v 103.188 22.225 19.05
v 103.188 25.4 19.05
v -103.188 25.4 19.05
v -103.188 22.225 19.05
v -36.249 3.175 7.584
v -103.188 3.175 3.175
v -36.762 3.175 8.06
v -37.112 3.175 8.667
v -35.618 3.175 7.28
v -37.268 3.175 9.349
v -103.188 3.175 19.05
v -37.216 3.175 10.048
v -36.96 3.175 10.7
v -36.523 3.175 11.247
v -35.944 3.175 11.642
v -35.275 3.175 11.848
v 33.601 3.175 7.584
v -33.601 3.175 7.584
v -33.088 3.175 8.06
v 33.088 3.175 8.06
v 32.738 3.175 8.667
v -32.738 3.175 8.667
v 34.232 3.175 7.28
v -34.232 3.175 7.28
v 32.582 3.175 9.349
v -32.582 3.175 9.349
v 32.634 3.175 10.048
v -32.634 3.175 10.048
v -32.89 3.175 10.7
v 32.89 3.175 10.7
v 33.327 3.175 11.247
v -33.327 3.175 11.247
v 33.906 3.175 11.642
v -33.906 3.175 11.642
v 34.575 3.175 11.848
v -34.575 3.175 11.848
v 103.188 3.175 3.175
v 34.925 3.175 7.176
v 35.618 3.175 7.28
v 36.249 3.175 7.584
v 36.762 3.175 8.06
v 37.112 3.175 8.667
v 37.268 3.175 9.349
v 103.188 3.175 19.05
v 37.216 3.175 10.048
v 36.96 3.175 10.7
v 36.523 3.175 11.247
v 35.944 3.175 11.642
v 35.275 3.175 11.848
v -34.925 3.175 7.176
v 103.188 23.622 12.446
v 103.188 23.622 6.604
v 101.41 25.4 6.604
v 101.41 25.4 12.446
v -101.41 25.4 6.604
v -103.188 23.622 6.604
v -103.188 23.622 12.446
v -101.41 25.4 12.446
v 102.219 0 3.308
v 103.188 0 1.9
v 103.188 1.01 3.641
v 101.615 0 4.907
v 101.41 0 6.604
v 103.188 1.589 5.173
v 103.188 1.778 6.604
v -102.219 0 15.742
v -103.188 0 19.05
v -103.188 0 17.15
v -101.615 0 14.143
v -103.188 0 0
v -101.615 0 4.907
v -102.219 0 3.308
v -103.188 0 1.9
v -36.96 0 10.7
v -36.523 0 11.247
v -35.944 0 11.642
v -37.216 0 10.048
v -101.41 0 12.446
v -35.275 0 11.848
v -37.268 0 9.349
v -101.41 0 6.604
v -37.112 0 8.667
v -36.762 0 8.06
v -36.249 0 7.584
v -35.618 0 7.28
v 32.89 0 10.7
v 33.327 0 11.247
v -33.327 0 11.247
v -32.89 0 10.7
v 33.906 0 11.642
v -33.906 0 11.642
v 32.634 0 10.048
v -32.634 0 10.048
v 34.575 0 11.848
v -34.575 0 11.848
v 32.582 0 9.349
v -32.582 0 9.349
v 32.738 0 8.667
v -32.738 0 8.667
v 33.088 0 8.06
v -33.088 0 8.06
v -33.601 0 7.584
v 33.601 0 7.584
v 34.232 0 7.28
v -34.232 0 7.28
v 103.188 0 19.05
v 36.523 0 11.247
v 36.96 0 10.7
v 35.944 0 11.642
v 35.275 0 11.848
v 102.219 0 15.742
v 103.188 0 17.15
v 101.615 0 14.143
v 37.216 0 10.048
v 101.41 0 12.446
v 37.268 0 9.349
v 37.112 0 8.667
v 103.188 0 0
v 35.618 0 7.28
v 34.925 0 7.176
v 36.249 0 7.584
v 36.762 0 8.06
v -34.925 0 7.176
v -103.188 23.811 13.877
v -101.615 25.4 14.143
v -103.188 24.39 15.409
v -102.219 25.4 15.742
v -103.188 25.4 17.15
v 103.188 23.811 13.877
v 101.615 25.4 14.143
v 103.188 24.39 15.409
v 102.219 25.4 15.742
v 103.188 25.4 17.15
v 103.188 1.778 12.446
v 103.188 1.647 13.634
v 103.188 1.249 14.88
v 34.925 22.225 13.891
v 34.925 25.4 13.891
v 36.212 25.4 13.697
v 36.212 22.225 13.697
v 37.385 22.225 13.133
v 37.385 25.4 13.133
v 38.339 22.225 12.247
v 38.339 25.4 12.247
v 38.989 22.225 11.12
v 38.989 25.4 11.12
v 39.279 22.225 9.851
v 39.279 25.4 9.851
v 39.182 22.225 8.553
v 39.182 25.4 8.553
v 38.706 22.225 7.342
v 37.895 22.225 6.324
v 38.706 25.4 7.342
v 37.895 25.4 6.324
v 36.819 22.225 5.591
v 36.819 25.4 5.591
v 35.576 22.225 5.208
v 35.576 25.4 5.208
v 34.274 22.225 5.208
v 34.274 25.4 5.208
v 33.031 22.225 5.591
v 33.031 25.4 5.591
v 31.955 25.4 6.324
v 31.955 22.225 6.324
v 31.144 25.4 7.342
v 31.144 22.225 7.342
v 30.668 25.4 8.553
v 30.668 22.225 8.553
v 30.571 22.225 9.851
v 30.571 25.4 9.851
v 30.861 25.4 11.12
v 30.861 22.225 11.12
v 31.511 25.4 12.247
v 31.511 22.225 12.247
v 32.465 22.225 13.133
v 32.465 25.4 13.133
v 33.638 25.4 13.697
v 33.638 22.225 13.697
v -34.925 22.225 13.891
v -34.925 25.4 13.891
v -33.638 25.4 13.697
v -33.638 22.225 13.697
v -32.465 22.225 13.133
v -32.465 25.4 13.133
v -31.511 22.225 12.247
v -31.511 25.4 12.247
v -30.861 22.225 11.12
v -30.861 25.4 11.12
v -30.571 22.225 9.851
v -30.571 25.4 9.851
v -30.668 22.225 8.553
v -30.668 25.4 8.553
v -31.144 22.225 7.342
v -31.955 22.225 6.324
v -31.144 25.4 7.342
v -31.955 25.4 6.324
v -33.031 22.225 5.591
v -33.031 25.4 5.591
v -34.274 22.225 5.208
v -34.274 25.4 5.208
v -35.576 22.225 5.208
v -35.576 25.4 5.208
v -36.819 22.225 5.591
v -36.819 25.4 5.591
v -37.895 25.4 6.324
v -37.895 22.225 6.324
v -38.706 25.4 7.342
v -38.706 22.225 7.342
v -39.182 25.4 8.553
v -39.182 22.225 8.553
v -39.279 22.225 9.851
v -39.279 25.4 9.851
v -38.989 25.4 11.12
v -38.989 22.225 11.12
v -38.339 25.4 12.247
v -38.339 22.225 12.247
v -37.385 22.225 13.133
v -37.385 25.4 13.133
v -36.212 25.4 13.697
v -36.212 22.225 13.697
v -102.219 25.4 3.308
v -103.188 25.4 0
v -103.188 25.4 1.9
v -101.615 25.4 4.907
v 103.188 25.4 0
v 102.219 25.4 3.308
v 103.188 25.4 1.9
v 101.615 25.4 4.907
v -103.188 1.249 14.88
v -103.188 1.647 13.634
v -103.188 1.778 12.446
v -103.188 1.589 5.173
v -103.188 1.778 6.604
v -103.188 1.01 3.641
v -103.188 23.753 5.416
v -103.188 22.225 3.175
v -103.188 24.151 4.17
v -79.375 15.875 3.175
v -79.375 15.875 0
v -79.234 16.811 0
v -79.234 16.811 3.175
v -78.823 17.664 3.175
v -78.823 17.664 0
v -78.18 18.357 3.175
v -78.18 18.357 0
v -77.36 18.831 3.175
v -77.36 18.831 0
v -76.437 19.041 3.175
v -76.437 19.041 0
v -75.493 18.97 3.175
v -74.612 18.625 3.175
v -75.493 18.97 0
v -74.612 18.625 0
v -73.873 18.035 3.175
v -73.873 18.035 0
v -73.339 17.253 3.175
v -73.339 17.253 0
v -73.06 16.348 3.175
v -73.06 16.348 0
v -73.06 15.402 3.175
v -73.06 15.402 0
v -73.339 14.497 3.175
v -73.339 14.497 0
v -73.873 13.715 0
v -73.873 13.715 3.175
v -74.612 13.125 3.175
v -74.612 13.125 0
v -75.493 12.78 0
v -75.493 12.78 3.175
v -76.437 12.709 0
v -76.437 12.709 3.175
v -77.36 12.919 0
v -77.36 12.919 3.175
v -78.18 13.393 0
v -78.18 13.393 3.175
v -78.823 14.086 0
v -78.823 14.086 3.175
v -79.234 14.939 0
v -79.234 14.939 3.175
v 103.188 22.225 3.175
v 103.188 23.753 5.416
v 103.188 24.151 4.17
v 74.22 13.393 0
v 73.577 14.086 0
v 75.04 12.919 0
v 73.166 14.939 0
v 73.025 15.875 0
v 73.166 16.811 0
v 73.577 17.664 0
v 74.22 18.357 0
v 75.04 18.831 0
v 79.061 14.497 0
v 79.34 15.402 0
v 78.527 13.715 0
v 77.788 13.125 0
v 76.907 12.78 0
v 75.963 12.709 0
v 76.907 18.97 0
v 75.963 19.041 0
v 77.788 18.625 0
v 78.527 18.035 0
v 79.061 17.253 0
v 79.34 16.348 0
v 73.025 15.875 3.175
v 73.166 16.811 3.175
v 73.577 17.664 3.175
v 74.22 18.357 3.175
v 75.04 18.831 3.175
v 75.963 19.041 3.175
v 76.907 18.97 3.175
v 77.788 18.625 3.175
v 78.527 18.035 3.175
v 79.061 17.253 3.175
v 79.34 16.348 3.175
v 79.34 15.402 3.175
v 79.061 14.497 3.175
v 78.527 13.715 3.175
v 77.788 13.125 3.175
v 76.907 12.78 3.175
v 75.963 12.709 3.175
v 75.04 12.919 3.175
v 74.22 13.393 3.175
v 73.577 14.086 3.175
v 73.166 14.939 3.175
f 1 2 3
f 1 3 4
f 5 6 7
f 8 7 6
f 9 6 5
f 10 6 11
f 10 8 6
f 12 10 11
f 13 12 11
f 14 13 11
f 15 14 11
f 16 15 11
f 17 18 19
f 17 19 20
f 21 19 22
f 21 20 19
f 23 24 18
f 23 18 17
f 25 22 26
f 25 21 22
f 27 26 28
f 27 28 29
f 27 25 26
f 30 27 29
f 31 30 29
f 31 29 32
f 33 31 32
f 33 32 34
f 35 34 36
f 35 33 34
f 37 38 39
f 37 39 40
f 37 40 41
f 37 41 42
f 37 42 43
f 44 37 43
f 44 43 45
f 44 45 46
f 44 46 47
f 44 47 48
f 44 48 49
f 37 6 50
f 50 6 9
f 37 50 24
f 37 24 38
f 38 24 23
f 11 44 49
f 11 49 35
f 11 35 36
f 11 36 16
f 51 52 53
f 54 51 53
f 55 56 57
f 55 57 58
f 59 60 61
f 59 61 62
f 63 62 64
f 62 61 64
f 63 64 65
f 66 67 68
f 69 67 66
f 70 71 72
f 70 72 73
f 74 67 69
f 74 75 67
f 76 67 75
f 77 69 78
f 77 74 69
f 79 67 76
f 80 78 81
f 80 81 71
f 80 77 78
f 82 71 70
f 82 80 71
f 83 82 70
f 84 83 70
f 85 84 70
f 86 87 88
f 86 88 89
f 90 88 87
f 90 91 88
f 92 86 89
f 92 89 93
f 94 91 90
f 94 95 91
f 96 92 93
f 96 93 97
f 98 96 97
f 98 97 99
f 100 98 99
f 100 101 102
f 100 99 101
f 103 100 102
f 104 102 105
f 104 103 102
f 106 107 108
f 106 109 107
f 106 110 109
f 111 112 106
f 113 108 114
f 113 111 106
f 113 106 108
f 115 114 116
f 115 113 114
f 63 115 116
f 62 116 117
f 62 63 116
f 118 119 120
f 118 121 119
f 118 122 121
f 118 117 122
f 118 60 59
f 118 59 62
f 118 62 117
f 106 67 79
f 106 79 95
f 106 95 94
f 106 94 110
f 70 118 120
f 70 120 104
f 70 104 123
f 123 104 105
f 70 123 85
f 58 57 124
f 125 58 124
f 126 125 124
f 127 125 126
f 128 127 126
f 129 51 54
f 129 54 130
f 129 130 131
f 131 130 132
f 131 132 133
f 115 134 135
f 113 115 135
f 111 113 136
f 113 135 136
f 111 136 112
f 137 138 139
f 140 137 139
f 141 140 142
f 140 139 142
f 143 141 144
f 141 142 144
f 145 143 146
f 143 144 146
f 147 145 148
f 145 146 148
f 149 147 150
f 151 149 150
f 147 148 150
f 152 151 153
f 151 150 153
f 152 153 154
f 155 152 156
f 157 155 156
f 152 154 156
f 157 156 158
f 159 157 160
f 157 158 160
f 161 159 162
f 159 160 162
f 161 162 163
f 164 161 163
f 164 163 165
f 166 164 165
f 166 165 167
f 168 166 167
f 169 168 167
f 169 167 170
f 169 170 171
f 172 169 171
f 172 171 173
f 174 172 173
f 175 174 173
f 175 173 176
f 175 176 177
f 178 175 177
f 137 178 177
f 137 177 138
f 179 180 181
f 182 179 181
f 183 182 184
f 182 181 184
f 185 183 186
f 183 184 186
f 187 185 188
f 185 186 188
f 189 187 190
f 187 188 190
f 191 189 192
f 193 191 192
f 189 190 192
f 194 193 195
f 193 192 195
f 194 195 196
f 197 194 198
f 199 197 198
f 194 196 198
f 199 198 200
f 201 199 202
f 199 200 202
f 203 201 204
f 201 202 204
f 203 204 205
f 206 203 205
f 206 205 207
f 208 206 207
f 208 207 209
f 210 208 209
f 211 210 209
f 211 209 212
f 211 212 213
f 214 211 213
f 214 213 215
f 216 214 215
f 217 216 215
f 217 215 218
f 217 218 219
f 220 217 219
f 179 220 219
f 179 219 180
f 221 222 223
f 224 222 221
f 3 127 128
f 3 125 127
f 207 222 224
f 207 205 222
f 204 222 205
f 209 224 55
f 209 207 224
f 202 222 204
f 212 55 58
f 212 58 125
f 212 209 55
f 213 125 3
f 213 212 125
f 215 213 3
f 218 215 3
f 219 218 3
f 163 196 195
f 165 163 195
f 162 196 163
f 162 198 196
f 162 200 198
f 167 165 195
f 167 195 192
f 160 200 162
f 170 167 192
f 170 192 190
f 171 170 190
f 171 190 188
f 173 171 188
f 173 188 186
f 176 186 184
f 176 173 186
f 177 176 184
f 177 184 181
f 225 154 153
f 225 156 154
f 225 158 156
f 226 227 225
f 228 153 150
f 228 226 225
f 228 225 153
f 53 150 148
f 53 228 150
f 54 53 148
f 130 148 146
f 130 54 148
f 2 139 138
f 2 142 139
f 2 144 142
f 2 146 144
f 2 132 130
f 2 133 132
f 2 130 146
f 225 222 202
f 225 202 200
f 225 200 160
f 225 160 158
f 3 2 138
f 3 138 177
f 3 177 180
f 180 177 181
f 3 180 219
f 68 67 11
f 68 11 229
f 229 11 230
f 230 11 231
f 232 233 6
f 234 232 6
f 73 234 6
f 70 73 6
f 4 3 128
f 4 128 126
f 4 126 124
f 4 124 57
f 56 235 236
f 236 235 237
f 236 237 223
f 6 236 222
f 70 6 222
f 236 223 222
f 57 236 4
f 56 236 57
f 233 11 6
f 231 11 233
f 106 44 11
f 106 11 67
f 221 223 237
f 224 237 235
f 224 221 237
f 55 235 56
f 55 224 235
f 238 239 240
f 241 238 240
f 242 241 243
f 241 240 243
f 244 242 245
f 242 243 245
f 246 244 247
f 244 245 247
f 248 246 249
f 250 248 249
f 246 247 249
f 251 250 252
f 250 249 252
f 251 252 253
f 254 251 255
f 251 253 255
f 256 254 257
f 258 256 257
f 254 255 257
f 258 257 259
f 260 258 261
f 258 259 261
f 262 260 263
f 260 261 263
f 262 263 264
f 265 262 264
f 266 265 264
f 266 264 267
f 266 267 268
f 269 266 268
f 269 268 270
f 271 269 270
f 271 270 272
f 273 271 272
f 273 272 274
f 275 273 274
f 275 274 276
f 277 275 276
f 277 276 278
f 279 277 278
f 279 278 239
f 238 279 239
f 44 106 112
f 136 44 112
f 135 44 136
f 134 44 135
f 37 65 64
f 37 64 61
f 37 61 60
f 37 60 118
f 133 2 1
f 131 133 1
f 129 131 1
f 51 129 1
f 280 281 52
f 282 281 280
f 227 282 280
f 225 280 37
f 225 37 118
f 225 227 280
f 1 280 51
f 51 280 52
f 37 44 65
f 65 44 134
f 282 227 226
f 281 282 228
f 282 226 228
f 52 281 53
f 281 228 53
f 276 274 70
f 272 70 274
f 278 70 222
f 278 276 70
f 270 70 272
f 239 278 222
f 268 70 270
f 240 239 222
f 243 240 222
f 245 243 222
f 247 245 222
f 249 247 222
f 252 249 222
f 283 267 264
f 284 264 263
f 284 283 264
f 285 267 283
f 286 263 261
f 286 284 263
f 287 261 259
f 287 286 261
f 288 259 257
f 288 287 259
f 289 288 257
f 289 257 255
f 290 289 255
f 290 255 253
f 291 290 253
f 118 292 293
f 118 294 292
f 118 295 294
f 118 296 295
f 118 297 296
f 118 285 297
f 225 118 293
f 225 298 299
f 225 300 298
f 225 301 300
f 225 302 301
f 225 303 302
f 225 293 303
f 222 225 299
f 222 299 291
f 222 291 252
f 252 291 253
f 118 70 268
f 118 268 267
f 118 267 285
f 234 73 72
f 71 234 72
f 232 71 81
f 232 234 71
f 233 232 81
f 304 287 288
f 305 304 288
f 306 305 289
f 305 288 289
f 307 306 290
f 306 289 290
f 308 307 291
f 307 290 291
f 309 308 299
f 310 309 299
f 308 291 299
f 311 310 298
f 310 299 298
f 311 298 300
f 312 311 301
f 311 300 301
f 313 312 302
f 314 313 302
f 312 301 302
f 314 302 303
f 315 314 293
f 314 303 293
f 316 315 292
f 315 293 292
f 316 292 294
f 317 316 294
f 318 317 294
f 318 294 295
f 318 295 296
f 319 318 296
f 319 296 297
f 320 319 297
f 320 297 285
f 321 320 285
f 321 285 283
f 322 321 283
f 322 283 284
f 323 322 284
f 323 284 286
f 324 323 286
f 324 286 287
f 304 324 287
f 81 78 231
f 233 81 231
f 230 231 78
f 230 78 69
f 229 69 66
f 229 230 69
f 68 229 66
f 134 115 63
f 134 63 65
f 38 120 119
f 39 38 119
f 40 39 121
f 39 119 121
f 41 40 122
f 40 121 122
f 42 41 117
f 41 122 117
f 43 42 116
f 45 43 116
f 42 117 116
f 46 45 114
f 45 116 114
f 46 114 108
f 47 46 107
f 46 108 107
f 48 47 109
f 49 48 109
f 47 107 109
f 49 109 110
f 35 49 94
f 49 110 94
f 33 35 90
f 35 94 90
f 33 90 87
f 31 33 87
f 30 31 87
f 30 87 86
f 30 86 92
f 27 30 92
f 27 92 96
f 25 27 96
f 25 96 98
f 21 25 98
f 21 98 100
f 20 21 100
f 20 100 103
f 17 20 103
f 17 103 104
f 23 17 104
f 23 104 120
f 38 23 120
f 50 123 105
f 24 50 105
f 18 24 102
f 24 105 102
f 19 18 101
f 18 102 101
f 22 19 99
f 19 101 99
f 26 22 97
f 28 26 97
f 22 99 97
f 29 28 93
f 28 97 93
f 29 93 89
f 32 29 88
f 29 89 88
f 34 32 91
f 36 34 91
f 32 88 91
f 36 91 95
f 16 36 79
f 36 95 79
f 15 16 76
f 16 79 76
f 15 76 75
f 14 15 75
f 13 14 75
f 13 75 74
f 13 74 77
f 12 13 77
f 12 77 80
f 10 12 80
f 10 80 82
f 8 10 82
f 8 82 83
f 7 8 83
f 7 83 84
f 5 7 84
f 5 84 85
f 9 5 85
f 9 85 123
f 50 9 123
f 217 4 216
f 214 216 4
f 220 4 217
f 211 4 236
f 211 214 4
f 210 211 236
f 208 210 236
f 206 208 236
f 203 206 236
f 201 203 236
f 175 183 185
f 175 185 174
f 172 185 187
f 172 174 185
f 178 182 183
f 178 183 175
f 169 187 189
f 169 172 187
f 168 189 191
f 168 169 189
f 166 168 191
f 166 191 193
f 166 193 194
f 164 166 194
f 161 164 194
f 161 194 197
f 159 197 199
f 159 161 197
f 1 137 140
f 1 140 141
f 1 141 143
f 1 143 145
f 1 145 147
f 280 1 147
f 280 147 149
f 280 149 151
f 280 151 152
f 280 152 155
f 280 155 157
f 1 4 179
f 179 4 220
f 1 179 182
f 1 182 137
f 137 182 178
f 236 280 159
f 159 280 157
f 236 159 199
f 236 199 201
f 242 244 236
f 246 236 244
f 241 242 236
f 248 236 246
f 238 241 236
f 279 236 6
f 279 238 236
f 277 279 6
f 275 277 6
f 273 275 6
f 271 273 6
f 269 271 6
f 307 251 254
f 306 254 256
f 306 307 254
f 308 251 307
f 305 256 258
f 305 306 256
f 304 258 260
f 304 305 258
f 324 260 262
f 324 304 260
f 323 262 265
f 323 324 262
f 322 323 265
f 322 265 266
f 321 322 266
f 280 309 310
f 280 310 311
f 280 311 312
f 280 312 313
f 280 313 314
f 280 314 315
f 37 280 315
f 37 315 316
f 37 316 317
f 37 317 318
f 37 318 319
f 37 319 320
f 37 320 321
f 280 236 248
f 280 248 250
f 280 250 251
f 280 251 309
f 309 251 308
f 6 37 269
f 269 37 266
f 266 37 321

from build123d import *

# Parameters (mm, degrees)
BOSS_EXTRUDE1_DEPTH = 103.1875
CUT_EXTRUDE2_REACH  = 109.962
SKETCH3_R           = 2.3495
CUT_EXTRUDE3_REACH  = 109.962
SKETCH4_R           = 4.36626
CUT_EXTRUDE4_REACH  = 109.962
SKETCH5_R           = 3.175


with BuildPart() as part:
    # Sketch1 → Boss-Extrude1 (new, symmetric)
    with BuildSketch(Plane(origin=(0, 0, 0), x_dir=(0, 0, -1), z_dir=(1, 0, 0))):
        Polygon((0, 25.4), (-19.05, 25.4), (-19.05, 22.225), (-3.175, 22.225), (-3.175, 3.175), (-19.05, 3.175), (-19.05, 0), (0, 0), align=None)
    extrude(amount=BOSS_EXTRUDE1_DEPTH, both=True)

    # Sketch3 → Cut-Extrude2 (cut, up to next)
    with BuildSketch(Plane.XZ, mode=Mode.PRIVATE) as cut_extrude2_sk1:
        with Locations(Location((34.925, 9.525, 0), (0, 0, 270))):
            Circle(SKETCH3_R)
    cut_extrude2_tool1 = extrude(cut_extrude2_sk1.sketch, amount=-CUT_EXTRUDE2_REACH, mode=Mode.PRIVATE) & part.part
    # Sketch3 → Cut-Extrude2 (cut, up to next)
    with BuildSketch(Plane.XZ, mode=Mode.PRIVATE) as cut_extrude2_sk2:
        with Locations(Location((-34.925, 9.525, 0), (0, 0, 270))):
            Circle(SKETCH3_R)
    cut_extrude2_tool2 = extrude(cut_extrude2_sk2.sketch, amount=-CUT_EXTRUDE2_REACH, mode=Mode.PRIVATE) & part.part
    add(cut_extrude2_tool1.solids().sort_by_distance((34.925, 0, 9.525))[0], mode=Mode.SUBTRACT)
    add(cut_extrude2_tool2.solids().sort_by_distance((-34.925, 0, 9.525))[0], mode=Mode.SUBTRACT)

    # Sketch4 → Cut-Extrude3 (cut, up to next)
    with BuildSketch(Plane(origin=(0, 25.4, 0), x_dir=(1, 0, 0), z_dir=(0, 1, 0)), mode=Mode.PRIVATE) as cut_extrude3_sk1:
        with Locations(Location((-34.925, -9.525, 0), (0, 0, 270))):
            Circle(SKETCH4_R)
    cut_extrude3_tool1 = extrude(cut_extrude3_sk1.sketch, amount=-CUT_EXTRUDE3_REACH, mode=Mode.PRIVATE) & part.part
    # Sketch4 → Cut-Extrude3 (cut, up to next)
    with BuildSketch(Plane(origin=(0, 25.4, 0), x_dir=(1, 0, 0), z_dir=(0, 1, 0)), mode=Mode.PRIVATE) as cut_extrude3_sk2:
        with Locations(Location((34.925, -9.525, 0), (0, 0, 270))):
            Circle(SKETCH4_R)
    cut_extrude3_tool2 = extrude(cut_extrude3_sk2.sketch, amount=-CUT_EXTRUDE3_REACH, mode=Mode.PRIVATE) & part.part
    add(cut_extrude3_tool1.solids().sort_by_distance((-34.925, 25.4, 9.525))[0], mode=Mode.SUBTRACT)
    add(cut_extrude3_tool2.solids().sort_by_distance((34.925, 25.4, 9.525))[0], mode=Mode.SUBTRACT)

    # Sketch5 → Cut-Extrude4 (cut, up to next)
    with BuildSketch(Plane(origin=(0, 0, 0), x_dir=(-1, 0, 0), z_dir=(0, 0, -1)), mode=Mode.PRIVATE) as cut_extrude4_sk1:
        with Locations((-76.2, 15.875)):
            Circle(SKETCH5_R)
    cut_extrude4_tool1 = extrude(cut_extrude4_sk1.sketch, amount=-CUT_EXTRUDE4_REACH, mode=Mode.PRIVATE) & part.part
    # Sketch5 → Cut-Extrude4 (cut, up to next)
    with BuildSketch(Plane(origin=(0, 0, 0), x_dir=(-1, 0, 0), z_dir=(0, 0, -1)), mode=Mode.PRIVATE) as cut_extrude4_sk2:
        with Locations((76.2, 15.875)):
            Circle(SKETCH5_R)
    cut_extrude4_tool2 = extrude(cut_extrude4_sk2.sketch, amount=-CUT_EXTRUDE4_REACH, mode=Mode.PRIVATE) & part.part
    add(cut_extrude4_tool1.solids().sort_by_distance((76.2, 15.875, 0))[0], mode=Mode.SUBTRACT)
    add(cut_extrude4_tool2.solids().sort_by_distance((-76.2, 15.875, 0))[0], mode=Mode.SUBTRACT)

    # Cut-Sweep1: sweep along a path in Sketch6
    with BuildLine(Plane(origin=(0, 25.4, 0), x_dir=(1, 0, 0), z_dir=(0, 1, 0))) as cut_sweep1_path:
        Line((-111.0615, 0.508), (-108.5215, 0.508))
        ThreePointArc((-108.5215, 0.508), (-103.492556572, -1.575056572), (-101.4095, -6.604))
        Line((-101.4095, -6.604), (-101.4095, -12.446))
        ThreePointArc((-101.4095, -12.446), (-103.492556572, -17.474943428), (-108.5215, -19.558))
        Line((-108.5215, -19.558), (-111.0615, -19.558))
    # Sketch7 → Cut-Sweep1 (sweep, cut)
    with BuildSketch(Plane(origin=(-111.0615, 25.4, -0.508), x_dir=(0, 0, -1), z_dir=(1, 0, 0))):
        Polygon((-4.572, -4.572), (-4.572, 0.508), (0.508, 0.508), align=None)
        Polygon((-4.572, -20.828), (-4.572, -25.908), (0.508, -25.908), align=None)
    cut_sweep1 = sweep(path=cut_sweep1_path.line, mode=Mode.SUBTRACT)

    # Mirror1: Cut-Sweep1 across plane
    add(cut_sweep1.mirror(Plane(origin=(0, 0, 0), x_dir=(0, 0, 1), z_dir=(1, 0, 0))), mode=Mode.SUBTRACT)


solid = part.part
